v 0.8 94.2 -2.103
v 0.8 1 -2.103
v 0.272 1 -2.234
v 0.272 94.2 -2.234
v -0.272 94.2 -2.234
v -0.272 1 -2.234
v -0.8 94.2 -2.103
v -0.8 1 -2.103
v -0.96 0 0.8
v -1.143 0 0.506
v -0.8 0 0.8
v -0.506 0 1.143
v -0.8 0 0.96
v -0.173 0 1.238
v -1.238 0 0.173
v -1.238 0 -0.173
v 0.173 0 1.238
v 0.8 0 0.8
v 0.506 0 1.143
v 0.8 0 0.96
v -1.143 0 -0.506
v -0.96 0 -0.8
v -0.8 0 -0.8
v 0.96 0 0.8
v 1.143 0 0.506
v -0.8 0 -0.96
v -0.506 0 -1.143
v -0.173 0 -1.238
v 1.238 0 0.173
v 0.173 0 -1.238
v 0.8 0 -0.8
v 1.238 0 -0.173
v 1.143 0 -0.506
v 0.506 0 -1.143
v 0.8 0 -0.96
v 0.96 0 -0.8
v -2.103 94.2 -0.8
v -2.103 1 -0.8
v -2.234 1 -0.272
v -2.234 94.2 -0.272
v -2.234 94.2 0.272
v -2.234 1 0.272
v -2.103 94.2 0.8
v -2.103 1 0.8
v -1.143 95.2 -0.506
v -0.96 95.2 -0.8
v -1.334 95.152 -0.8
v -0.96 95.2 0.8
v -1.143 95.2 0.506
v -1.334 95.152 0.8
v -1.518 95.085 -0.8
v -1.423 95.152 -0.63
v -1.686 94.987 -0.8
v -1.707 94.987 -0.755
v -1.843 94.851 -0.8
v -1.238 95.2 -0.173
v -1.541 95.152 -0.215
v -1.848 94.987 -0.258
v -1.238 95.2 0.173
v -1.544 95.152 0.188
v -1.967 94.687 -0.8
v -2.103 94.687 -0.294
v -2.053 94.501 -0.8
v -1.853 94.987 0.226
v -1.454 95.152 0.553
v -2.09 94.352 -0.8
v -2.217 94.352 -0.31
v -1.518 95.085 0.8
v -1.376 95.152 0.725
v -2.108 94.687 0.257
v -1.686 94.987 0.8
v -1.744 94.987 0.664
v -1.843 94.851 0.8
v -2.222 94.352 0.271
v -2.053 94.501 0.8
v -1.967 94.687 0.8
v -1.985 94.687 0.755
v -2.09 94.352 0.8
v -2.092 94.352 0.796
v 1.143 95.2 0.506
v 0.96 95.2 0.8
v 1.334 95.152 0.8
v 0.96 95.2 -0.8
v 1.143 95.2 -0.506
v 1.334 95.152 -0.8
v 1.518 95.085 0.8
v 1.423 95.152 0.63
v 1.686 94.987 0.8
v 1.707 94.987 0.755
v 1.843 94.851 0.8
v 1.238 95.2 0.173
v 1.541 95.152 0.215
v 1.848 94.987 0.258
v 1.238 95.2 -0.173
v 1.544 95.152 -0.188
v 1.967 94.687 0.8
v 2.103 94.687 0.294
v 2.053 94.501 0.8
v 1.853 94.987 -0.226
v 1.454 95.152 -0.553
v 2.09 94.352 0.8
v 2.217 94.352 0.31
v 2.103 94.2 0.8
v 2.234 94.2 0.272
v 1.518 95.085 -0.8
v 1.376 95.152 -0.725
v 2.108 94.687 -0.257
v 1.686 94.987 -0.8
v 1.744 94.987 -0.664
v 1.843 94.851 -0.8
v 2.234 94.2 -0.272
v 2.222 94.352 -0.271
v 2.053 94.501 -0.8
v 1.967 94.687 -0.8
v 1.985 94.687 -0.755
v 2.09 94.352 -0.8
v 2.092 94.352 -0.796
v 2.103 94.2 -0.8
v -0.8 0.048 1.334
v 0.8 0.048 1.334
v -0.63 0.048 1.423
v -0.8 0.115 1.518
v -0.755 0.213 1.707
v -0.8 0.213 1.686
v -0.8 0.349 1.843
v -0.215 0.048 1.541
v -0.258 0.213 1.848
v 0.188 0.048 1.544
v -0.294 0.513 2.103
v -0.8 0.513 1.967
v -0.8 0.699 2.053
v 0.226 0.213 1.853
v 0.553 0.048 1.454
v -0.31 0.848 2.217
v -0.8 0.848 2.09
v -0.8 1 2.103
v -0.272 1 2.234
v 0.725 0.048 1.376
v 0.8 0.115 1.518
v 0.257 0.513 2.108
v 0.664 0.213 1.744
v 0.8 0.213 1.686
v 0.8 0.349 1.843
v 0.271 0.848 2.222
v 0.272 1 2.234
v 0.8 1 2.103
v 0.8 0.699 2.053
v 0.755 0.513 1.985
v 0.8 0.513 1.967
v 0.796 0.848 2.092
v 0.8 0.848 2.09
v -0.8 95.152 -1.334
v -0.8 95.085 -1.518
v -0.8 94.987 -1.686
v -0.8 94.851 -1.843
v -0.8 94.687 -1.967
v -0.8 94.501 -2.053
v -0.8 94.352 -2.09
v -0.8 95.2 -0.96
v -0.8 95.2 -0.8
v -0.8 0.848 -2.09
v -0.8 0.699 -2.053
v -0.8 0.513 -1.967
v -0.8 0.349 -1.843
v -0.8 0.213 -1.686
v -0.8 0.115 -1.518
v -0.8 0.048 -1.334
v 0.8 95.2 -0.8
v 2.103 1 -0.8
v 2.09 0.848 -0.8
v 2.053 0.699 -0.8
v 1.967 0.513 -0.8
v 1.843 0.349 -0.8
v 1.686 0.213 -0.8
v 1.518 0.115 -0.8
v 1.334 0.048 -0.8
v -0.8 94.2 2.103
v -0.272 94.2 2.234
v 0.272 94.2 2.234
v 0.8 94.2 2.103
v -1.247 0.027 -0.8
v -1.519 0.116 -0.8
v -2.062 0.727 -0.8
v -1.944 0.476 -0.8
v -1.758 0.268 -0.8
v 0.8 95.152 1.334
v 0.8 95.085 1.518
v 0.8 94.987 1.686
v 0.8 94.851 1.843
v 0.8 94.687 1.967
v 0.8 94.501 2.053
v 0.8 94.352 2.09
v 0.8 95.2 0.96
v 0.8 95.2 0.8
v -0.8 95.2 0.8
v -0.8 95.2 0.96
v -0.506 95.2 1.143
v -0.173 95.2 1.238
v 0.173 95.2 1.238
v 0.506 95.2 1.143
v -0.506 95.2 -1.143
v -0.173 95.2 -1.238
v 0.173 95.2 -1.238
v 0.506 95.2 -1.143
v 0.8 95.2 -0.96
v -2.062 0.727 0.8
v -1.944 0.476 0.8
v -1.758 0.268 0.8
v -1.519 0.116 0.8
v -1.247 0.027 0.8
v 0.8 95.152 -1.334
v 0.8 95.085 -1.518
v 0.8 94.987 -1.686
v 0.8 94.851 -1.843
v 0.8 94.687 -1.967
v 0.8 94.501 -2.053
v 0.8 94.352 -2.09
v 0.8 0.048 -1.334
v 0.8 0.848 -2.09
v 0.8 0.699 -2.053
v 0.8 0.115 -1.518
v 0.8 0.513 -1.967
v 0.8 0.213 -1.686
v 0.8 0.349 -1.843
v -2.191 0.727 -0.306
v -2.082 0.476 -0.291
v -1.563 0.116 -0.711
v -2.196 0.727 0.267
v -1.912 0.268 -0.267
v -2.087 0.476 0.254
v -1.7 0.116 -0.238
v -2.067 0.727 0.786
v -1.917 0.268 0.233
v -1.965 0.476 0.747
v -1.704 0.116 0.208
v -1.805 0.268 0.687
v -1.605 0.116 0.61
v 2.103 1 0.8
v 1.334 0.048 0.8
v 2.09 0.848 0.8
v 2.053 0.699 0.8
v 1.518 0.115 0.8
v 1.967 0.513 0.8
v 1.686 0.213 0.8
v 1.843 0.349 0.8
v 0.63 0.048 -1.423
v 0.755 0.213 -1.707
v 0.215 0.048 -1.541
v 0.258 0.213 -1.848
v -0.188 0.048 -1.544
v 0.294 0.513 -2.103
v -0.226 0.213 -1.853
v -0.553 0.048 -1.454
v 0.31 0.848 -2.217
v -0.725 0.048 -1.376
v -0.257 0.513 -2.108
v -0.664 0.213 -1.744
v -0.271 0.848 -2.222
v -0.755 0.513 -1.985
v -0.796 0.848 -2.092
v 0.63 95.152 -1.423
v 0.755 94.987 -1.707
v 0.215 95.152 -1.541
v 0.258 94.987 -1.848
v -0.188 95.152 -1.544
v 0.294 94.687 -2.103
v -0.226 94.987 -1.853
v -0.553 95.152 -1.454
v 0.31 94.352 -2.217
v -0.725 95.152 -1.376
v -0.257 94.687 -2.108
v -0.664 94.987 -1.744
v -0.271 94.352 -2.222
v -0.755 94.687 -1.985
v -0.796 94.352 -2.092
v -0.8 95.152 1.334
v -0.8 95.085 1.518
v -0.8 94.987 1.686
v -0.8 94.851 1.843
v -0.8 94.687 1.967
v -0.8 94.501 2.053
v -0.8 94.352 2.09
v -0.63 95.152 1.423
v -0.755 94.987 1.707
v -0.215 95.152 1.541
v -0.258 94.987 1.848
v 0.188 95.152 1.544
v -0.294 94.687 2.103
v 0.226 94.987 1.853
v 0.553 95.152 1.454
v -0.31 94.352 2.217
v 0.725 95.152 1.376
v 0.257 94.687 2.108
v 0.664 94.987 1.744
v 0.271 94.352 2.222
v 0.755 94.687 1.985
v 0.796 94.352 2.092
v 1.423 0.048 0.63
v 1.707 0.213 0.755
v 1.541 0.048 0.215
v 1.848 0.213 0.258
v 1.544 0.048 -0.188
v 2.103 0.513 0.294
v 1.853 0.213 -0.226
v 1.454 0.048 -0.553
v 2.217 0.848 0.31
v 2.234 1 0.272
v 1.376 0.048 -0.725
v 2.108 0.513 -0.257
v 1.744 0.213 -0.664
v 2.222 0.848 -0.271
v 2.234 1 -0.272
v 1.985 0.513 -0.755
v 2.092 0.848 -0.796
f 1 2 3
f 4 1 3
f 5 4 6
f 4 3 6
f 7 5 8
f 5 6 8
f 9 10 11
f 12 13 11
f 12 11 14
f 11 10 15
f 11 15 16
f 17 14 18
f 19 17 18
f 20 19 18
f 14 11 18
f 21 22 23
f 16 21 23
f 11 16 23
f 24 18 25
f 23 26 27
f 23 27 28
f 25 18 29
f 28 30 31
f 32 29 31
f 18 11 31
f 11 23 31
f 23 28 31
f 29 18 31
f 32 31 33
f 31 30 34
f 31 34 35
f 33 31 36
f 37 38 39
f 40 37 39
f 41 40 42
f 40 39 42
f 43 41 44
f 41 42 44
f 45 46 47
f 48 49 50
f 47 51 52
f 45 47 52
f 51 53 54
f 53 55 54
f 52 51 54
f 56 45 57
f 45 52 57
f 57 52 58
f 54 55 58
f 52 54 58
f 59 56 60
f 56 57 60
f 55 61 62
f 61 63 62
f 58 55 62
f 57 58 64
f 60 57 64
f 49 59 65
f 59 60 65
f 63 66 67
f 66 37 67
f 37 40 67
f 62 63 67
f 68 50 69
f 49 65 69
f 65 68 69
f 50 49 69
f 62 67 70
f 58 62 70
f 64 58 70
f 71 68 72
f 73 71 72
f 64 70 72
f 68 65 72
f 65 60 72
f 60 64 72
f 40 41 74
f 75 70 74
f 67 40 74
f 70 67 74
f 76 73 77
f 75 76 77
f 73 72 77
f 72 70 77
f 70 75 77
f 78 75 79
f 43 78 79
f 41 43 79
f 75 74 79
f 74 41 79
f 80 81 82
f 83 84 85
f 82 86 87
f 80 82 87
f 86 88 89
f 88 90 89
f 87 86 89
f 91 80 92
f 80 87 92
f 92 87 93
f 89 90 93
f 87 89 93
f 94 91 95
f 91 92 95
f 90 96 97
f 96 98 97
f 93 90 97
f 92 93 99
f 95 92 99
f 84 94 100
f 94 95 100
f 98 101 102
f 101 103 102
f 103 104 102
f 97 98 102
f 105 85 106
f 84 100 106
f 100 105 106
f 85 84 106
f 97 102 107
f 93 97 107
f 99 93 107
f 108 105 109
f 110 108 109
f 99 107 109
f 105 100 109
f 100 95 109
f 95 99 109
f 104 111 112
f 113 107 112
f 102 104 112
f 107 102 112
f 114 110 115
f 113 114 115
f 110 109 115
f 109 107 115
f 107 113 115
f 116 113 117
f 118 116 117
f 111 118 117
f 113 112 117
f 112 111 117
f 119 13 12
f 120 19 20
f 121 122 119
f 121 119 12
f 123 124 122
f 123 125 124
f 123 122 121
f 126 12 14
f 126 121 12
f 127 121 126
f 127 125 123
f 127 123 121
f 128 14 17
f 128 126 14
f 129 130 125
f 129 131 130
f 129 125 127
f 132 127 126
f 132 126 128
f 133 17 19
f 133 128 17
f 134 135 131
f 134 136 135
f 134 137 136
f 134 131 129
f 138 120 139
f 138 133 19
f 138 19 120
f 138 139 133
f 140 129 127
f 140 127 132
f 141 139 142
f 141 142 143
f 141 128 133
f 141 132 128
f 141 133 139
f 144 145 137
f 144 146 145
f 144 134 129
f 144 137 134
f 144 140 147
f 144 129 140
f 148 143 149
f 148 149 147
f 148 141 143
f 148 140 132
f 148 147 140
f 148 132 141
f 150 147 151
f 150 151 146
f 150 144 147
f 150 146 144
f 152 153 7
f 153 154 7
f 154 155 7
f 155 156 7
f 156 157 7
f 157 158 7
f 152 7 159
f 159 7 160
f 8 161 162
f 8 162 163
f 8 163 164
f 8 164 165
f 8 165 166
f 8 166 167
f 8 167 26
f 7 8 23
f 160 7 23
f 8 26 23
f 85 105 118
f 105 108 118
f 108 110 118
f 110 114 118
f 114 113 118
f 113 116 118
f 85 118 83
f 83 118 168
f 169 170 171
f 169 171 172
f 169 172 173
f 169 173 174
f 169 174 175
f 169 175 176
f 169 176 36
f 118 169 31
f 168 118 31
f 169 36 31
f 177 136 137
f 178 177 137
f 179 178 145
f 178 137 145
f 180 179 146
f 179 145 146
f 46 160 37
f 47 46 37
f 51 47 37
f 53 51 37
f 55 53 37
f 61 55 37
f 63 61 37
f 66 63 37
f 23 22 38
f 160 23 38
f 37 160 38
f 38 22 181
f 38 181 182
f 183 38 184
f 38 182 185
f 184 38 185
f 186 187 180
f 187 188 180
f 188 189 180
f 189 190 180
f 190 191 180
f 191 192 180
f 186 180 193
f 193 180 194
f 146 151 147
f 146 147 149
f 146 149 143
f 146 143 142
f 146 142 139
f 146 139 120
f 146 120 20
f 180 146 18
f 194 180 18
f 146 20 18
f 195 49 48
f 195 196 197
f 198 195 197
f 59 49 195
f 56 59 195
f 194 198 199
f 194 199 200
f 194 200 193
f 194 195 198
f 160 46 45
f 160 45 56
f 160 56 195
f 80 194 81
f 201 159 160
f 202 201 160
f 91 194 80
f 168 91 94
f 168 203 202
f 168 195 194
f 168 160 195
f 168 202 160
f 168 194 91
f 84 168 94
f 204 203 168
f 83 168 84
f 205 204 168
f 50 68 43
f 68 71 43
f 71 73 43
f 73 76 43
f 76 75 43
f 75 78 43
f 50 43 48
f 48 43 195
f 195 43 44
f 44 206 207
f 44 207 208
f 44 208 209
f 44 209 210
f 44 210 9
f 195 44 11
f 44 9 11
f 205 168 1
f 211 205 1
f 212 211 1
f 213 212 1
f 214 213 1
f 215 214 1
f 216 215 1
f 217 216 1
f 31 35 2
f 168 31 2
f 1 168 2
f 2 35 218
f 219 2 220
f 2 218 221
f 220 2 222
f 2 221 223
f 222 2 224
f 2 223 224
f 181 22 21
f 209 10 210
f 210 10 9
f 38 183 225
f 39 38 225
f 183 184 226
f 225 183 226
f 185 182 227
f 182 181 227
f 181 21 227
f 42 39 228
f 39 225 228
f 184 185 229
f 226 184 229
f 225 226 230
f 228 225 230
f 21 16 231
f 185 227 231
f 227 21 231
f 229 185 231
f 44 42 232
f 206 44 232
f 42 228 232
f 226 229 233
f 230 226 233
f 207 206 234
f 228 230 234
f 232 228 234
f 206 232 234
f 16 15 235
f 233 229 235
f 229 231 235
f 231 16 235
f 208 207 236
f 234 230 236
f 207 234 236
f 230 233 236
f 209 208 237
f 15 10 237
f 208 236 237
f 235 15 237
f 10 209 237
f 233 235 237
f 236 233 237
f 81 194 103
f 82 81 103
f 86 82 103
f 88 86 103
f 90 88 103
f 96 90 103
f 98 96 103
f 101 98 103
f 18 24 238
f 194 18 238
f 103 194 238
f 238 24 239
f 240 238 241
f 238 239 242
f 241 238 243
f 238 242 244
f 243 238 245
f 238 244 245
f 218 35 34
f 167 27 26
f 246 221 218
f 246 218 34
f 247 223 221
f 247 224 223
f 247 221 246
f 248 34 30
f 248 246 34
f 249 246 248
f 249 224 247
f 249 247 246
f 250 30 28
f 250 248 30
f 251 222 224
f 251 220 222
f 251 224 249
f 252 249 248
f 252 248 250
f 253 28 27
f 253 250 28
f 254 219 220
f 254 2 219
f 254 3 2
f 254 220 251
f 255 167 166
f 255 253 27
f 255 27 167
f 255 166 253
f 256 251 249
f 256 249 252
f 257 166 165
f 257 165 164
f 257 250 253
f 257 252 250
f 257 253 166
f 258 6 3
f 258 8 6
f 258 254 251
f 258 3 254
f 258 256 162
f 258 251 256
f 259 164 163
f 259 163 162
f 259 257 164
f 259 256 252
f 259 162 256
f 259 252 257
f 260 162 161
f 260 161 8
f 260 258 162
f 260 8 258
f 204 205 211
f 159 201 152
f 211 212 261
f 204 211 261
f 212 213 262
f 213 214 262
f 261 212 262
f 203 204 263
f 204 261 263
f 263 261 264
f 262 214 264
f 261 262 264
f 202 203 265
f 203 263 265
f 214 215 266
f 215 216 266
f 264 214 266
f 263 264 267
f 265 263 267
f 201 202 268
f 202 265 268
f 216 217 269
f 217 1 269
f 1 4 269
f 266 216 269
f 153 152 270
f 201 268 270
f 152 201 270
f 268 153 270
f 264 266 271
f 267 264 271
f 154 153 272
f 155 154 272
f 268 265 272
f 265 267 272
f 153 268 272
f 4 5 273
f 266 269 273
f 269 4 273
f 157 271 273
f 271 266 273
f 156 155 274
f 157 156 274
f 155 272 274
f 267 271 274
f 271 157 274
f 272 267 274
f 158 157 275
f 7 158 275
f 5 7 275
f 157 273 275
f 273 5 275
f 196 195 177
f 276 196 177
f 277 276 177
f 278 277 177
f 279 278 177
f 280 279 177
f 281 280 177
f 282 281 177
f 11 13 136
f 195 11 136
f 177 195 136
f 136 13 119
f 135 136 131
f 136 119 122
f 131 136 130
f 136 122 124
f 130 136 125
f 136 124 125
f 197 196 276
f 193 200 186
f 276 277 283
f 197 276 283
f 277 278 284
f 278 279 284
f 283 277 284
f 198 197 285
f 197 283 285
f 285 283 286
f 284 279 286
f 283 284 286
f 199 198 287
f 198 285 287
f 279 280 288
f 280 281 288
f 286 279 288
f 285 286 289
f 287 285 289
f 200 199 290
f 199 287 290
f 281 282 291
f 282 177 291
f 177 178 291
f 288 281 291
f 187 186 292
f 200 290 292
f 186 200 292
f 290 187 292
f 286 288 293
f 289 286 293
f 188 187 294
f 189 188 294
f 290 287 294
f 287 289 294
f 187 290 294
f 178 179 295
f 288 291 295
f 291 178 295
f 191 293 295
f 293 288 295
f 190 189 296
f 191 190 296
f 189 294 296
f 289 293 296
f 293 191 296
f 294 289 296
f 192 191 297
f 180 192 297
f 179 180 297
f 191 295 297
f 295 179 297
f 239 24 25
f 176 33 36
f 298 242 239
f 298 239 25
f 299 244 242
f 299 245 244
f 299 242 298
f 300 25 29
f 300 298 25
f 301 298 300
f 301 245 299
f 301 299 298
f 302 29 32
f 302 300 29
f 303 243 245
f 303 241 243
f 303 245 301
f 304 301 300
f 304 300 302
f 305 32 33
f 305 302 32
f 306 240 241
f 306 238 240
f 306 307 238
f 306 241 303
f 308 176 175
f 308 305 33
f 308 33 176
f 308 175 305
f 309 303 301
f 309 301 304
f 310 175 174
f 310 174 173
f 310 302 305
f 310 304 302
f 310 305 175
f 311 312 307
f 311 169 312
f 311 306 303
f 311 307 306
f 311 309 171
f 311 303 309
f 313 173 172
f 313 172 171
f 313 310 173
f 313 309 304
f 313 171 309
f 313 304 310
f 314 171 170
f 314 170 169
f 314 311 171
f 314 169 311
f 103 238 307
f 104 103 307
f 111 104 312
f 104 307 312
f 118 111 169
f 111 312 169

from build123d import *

# Parameters (mm, degrees)
BOSS_EXTRUDE1_DEPTH = 95.2
FILLET1_R           = 1
FILLET2_R           = 1
FILLET3_R           = 1
FILLET4_R           = 1
FILLET20_R          = 1
FILLET21_R          = 1
FILLET22_R          = 1
FILLET23_R          = 1


with BuildPart() as part:
    # Sketch1 → Boss-Extrude1 (new body)
    with BuildSketch(Plane(origin=(0, 0, 0), x_dir=(1, 0, 0), z_dir=(0, 1, 0))):
        with BuildLine():
            Line((-0.8, -0.8), (-0.8, -2.102974084))
            ThreePointArc((-0.8, -2.102974084), (0, -2.25), (0.8, -2.102974084))
            Line((0.8, -2.102974084), (0.8, -0.8))
            Line((0.8, -0.8), (2.102974084, -0.8))
            ThreePointArc((2.102974084, -0.8), (2.25, 0), (2.102974084, 0.8))
            Line((2.102974084, 0.8), (0.8, 0.8))
            Line((0.8, 0.8), (0.8, 2.102974084))
            ThreePointArc((0.8, 2.102974084), (0, 2.25), (-0.8, 2.102974084))
            Line((-0.8, 2.102974084), (-0.8, 0.8))
            Line((-0.8, 0.8), (-2.102974084, 0.8))
            ThreePointArc((-2.102974084, 0.8), (-2.25, 0), (-2.102974084, -0.8))
            Line((-2.102974084, -0.8), (-0.8, -0.8))
        make_face()
    extrude(amount=BOSS_EXTRUDE1_DEPTH)

    # Fillet1
    fillet1_edges = [part.edges().sort_by_distance(p)[0] for p in [
        (-2.25, 0, 0),
    ]]
    fillet(fillet1_edges, radius=FILLET1_R)

    # Fillet2
    fillet2_edges = [part.edges().sort_by_distance(p)[0] for p in [
        (0, 0, 2.25),
    ]]
    fillet(fillet2_edges, radius=FILLET2_R)

    # Fillet3
    fillet3_edges = [part.edges().sort_by_distance(p)[0] for p in [
        (2.25, 0, 0),
    ]]
    fillet(fillet3_edges, radius=FILLET3_R)

    # Fillet4
    fillet4_edges = [part.edges().sort_by_distance(p)[0] for p in [
        (0, 0, -2.25),
    ]]
    fillet(fillet4_edges, radius=FILLET4_R)

    # Fillet20
    fillet20_edges = [part.edges().sort_by_distance(p)[0] for p in [
        (2.25, 95.2, 0),
    ]]
    fillet(fillet20_edges, radius=FILLET20_R)

    # Fillet21
    fillet21_edges = [part.edges().sort_by_distance(p)[0] for p in [
        (0, 95.2, 2.25),
    ]]
    fillet(fillet21_edges, radius=FILLET21_R)

    # Fillet22
    fillet22_edges = [part.edges().sort_by_distance(p)[0] for p in [
        (-2.25, 95.2, 0),
    ]]
    fillet(fillet22_edges, radius=FILLET22_R)

    # Fillet23
    fillet23_edges = [part.edges().sort_by_distance(p)[0] for p in [
        (0, 95.2, -2.25),
    ]]
    fillet(fillet23_edges, radius=FILLET23_R)


solid = part.part
